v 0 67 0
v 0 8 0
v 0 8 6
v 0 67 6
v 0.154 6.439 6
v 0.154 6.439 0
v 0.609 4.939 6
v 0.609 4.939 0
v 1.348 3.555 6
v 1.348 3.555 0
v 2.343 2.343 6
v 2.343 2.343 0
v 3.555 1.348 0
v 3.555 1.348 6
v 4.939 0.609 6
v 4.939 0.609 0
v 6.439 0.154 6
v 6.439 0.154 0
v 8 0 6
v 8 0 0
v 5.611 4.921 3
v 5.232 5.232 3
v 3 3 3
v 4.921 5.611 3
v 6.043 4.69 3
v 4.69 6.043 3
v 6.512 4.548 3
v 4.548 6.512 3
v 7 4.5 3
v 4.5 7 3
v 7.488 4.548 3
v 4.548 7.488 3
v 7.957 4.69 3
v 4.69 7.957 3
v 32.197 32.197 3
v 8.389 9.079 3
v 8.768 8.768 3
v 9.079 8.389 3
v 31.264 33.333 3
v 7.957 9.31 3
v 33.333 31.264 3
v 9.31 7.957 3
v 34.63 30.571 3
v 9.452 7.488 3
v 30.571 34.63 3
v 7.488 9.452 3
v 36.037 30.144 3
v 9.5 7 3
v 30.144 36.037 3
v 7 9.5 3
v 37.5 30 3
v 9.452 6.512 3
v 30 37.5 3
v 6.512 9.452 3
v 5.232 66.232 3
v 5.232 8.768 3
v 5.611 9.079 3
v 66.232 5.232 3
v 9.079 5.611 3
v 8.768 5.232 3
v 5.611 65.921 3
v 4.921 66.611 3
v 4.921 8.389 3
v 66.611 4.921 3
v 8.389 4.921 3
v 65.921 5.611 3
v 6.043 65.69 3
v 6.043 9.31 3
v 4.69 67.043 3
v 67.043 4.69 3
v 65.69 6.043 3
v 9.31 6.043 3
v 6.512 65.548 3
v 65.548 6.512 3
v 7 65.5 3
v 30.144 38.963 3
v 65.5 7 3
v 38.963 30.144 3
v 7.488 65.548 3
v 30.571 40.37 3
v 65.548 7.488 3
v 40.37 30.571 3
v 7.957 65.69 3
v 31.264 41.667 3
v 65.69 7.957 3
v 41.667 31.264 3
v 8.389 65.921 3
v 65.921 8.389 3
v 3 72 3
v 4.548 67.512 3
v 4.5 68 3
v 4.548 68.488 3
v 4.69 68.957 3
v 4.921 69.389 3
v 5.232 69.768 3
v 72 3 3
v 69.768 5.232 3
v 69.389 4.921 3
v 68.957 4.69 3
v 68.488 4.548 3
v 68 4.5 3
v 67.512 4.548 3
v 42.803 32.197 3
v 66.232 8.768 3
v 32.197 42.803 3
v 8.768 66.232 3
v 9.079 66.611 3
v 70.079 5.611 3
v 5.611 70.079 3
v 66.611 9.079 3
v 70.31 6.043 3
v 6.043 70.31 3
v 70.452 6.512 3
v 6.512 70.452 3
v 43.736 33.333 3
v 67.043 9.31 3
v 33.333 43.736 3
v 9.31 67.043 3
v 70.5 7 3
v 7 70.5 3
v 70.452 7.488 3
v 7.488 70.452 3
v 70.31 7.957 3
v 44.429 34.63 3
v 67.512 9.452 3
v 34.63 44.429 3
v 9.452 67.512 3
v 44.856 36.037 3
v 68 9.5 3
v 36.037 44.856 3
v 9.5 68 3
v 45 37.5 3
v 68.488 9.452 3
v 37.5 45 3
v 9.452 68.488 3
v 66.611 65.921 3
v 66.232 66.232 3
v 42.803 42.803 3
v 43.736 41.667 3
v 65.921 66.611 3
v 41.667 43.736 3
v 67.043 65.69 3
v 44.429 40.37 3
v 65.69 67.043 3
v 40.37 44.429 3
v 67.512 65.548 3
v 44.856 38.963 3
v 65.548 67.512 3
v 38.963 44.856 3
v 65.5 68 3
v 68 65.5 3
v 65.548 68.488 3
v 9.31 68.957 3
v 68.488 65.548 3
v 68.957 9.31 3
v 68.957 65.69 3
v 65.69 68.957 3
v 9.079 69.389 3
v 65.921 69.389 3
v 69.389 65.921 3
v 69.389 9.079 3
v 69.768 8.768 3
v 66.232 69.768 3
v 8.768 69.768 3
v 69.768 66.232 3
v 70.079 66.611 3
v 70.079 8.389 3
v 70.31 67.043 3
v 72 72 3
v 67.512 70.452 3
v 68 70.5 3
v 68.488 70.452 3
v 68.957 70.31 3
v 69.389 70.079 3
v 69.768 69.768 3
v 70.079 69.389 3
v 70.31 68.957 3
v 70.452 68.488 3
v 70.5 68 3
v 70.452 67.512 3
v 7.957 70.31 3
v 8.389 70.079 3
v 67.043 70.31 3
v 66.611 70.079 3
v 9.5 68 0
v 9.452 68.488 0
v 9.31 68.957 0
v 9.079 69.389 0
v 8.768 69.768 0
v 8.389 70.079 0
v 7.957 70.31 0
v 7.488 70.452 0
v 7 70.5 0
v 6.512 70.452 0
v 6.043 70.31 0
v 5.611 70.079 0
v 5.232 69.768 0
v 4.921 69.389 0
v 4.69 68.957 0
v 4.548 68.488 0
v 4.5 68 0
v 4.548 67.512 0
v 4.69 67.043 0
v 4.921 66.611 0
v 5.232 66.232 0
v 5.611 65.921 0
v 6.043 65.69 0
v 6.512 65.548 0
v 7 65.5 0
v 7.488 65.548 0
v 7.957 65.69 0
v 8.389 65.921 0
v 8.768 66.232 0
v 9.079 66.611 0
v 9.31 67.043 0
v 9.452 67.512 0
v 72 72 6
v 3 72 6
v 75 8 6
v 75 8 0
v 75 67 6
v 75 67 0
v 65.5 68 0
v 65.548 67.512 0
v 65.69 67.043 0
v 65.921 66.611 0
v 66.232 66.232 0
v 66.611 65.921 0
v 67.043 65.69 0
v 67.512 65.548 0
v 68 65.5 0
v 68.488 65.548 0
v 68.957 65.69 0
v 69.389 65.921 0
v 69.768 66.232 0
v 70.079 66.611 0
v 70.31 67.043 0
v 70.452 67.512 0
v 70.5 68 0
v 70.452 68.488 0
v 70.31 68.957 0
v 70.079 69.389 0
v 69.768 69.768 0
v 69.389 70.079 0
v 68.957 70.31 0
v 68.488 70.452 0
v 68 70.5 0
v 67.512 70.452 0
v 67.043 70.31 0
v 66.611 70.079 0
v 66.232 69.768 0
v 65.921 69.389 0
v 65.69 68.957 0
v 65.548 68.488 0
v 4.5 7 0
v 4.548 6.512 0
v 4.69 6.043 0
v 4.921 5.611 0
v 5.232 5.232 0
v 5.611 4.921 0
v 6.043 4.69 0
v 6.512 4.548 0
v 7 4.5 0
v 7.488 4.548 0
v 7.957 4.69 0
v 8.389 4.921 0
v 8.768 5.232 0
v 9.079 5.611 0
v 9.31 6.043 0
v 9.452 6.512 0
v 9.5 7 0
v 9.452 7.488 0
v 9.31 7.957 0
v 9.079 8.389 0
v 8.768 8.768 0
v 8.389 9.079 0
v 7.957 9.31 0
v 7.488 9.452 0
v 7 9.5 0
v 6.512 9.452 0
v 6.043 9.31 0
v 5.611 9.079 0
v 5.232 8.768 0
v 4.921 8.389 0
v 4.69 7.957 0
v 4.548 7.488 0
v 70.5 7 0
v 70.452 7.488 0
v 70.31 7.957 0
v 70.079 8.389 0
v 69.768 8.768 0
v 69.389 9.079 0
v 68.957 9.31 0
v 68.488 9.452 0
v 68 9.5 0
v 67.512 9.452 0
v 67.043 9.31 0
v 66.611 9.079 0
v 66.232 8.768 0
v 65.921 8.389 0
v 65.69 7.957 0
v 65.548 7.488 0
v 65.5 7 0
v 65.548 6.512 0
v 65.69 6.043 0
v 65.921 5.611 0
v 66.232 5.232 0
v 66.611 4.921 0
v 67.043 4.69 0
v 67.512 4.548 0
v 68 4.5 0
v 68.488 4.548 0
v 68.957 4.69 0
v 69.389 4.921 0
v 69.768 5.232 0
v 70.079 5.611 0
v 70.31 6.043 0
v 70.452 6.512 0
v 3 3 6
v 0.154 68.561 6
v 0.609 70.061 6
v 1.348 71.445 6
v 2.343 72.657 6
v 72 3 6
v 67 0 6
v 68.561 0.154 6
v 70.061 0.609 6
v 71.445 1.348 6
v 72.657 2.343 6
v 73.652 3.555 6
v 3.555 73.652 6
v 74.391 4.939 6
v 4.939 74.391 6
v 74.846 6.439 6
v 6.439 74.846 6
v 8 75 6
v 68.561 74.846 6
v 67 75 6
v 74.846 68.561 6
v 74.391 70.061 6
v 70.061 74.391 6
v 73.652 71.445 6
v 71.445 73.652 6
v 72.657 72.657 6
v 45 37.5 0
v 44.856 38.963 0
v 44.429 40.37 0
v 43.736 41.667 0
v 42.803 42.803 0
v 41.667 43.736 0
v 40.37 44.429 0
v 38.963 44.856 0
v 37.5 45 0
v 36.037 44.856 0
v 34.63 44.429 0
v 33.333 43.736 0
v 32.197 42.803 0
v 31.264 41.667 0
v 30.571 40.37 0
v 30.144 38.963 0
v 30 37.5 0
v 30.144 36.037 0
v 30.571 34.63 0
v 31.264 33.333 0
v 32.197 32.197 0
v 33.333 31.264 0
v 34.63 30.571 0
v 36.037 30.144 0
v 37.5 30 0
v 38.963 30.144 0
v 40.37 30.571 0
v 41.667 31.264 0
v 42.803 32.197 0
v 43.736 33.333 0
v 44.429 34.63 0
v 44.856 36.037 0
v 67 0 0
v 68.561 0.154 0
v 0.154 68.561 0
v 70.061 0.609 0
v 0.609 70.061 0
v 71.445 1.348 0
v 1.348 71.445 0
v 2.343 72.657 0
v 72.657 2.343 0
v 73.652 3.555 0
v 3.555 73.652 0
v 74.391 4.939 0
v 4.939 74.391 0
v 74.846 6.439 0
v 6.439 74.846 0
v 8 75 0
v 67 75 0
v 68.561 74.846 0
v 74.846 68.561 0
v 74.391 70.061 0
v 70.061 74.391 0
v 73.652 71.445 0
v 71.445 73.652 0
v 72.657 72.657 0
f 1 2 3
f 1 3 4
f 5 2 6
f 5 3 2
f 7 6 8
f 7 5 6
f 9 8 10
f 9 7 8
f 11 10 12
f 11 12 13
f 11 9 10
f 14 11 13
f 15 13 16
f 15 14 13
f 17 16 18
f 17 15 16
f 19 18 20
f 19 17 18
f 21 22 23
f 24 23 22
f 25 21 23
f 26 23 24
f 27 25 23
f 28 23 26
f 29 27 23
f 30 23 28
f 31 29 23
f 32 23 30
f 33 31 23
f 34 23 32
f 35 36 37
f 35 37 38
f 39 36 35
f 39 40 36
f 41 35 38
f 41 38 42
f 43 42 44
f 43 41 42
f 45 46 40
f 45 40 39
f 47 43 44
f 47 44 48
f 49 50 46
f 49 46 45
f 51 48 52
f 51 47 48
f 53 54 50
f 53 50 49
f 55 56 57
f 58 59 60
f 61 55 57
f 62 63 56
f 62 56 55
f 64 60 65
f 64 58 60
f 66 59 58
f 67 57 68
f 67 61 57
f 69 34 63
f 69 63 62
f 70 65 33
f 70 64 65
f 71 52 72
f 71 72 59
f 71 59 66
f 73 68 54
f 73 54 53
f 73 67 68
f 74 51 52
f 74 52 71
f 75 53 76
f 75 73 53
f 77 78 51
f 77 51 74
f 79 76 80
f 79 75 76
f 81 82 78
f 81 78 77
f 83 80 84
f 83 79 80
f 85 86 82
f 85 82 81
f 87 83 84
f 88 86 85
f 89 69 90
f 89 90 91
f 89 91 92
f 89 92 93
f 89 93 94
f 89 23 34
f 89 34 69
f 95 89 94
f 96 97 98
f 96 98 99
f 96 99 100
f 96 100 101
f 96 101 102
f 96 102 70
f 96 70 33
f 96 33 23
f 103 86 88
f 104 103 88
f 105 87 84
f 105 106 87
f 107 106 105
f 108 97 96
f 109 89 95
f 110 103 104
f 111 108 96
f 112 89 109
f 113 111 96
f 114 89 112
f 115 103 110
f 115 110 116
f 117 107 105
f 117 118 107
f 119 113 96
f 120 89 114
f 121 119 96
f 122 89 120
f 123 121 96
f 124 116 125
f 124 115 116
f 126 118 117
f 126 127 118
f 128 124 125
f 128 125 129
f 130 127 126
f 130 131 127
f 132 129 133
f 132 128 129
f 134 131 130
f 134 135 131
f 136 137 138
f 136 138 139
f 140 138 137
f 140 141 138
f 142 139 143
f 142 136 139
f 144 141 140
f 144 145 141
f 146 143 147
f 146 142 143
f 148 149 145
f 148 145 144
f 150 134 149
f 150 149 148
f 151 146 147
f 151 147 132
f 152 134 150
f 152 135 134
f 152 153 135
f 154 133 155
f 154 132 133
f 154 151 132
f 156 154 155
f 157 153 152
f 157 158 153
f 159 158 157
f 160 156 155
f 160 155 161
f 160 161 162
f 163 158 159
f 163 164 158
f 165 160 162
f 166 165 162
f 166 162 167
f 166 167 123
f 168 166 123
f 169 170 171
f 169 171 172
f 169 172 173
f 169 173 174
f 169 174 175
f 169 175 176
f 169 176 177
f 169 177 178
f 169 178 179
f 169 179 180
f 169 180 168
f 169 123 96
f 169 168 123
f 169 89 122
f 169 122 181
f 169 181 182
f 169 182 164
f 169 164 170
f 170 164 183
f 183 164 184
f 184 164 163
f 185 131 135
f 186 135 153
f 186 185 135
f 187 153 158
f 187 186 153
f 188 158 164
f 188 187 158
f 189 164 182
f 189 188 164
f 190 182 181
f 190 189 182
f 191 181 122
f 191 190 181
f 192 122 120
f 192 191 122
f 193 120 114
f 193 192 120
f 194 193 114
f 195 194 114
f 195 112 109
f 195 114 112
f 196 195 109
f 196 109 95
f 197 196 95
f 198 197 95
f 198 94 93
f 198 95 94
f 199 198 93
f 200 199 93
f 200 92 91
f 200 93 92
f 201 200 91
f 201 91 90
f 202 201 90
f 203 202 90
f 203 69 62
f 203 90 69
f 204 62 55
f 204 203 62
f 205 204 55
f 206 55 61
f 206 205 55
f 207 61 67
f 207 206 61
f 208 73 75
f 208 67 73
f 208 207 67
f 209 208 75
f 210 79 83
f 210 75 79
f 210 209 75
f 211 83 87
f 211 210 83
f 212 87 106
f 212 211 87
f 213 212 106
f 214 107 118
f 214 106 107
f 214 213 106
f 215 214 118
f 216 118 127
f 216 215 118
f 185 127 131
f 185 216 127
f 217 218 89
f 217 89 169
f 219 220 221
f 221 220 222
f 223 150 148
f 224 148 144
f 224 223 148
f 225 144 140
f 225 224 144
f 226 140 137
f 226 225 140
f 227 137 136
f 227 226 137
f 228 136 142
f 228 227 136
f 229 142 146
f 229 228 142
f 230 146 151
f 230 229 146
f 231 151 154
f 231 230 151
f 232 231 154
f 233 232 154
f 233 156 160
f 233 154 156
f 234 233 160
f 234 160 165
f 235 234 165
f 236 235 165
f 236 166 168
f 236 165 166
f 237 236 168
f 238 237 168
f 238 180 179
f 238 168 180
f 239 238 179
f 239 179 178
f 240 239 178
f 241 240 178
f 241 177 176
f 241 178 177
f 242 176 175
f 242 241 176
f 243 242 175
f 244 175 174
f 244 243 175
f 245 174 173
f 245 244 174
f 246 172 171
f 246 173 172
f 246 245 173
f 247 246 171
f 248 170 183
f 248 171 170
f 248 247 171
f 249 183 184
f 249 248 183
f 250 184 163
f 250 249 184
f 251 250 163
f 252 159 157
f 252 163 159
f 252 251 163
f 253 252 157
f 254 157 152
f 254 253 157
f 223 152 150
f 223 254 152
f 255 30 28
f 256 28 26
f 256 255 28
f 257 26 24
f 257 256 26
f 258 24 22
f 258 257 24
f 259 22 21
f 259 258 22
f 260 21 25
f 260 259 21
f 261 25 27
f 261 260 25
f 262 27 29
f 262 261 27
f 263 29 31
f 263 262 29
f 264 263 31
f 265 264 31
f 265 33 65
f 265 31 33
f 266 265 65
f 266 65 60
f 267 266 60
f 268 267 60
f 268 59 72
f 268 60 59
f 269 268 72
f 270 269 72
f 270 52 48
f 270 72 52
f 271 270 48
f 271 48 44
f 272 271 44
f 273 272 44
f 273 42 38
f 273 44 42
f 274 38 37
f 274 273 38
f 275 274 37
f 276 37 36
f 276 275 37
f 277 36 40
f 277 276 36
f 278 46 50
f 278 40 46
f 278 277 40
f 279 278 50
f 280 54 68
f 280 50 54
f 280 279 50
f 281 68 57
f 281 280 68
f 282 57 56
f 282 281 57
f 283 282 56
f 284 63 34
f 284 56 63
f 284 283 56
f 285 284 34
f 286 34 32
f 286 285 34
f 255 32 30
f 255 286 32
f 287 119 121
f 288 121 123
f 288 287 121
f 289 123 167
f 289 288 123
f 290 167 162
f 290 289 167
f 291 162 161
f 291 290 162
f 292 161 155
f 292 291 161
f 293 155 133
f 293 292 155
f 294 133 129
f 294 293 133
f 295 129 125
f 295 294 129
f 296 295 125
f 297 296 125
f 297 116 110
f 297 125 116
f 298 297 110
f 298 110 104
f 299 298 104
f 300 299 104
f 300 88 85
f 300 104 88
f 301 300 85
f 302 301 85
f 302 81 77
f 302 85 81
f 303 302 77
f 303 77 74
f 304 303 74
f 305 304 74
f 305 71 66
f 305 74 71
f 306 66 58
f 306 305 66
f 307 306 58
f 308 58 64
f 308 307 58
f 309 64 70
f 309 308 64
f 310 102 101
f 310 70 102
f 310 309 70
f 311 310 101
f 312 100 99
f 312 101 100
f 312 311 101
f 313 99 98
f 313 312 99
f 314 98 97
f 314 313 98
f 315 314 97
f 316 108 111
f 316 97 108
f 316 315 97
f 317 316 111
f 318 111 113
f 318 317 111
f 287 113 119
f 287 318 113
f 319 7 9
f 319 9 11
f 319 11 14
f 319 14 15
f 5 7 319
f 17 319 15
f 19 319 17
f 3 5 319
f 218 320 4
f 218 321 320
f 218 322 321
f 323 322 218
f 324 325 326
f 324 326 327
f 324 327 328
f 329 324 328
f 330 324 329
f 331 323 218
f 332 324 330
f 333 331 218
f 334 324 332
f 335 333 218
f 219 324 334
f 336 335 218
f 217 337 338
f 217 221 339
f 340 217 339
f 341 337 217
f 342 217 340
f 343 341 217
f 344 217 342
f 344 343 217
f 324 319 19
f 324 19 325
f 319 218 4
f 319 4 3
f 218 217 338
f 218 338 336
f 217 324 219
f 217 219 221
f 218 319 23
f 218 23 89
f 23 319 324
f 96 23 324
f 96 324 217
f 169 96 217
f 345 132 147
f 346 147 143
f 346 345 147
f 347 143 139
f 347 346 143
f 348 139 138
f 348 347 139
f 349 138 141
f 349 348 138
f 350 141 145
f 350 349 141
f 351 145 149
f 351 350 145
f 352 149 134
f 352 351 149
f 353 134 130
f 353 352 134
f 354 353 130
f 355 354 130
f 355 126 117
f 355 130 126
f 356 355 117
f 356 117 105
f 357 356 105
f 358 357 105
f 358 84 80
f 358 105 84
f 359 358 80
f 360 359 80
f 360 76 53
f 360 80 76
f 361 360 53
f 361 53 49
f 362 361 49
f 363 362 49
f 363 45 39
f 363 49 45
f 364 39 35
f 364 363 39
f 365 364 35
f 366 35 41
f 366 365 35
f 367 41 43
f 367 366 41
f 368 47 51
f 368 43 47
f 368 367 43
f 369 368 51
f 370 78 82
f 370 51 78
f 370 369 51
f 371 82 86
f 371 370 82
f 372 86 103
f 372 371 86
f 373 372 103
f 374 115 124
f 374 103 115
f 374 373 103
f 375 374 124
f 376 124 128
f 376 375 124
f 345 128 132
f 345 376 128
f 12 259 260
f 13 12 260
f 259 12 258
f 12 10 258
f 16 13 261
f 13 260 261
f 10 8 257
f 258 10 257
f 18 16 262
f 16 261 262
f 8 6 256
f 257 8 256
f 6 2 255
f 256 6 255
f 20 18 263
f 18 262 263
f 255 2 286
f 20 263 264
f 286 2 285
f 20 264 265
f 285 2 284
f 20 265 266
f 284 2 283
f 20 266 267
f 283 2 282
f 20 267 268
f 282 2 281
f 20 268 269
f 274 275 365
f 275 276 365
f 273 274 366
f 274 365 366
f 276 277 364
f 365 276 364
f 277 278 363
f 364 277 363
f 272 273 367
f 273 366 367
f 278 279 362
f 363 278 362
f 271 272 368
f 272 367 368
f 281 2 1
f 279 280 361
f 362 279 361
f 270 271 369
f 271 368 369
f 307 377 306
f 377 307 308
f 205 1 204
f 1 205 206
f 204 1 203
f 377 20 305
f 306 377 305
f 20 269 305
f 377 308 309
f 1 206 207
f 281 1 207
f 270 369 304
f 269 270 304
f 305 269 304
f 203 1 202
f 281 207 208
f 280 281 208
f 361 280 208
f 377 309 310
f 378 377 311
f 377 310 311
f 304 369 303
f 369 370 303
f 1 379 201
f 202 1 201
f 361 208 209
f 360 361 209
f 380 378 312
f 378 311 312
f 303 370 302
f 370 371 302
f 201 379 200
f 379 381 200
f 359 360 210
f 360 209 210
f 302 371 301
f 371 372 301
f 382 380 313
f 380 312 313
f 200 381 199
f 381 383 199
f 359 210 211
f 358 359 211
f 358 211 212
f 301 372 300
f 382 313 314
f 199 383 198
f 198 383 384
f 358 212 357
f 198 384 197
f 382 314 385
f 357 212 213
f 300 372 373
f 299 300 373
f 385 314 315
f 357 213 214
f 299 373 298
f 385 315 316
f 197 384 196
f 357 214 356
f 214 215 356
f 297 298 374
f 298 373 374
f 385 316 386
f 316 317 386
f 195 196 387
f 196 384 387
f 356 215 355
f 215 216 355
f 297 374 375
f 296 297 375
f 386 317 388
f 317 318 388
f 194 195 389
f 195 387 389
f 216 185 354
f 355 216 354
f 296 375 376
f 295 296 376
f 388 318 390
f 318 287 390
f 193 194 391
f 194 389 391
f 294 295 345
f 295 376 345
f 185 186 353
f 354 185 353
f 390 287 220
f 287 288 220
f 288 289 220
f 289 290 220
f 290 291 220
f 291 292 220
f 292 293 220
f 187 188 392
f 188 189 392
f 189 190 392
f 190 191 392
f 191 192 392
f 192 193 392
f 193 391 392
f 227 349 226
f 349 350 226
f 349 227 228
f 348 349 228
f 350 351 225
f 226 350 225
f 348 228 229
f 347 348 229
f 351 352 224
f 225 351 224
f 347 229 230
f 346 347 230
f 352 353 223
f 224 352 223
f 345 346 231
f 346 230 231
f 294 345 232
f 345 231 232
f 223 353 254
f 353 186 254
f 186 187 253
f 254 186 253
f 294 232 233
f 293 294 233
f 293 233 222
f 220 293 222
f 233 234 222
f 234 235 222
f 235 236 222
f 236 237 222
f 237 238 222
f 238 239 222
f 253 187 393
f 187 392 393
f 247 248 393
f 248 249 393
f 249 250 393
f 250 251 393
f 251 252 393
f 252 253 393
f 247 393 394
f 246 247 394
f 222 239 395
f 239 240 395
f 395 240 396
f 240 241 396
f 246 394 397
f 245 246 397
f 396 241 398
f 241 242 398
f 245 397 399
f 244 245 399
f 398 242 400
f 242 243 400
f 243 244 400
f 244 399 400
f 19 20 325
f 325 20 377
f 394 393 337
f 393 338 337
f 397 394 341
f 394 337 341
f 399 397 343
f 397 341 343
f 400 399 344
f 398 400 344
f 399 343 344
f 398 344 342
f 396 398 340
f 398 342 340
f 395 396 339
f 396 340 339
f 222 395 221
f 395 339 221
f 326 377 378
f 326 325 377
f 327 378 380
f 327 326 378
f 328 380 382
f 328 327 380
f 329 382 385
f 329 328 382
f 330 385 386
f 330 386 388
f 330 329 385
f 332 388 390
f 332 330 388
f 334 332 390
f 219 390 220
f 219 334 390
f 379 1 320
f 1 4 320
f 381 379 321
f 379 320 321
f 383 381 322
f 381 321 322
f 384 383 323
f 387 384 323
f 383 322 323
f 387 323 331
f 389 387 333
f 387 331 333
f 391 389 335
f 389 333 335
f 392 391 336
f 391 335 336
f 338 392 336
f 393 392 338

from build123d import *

# Parameters (mm, degrees)
SKETCH1_W           = 75
SKETCH1_H           = 75
SKETCH1_R           = 2.5
SKETCH1_R_2         = 7.5
BOSS_EXTRUDE1_DEPTH = 6
SKETCH2_W           = 69
SKETCH2_H           = 69
CUT_EXTRUDE1_DEPTH  = 3
FILLET1_R           = 8


with BuildPart() as part:
    # Sketch1 → Boss-Extrude1 (new body)
    with BuildSketch(Plane.XY):
        with Locations((37.5, 37.5)):
            Rectangle(SKETCH1_W, SKETCH1_H)
        with Locations((7, 68)):
            Circle(SKETCH1_R, mode=Mode.SUBTRACT)
        with Locations(Location((68, 68, 0), (0, 0, 180))):
            Circle(SKETCH1_R, mode=Mode.SUBTRACT)
        with Locations((68, 7)):
            Circle(SKETCH1_R, mode=Mode.SUBTRACT)
        with Locations(Location((7, 7, 0), (0, 0, 180))):
            Circle(SKETCH1_R, mode=Mode.SUBTRACT)
        with Locations((37.5, 37.5)):
            Circle(SKETCH1_R_2, mode=Mode.SUBTRACT)
    extrude(amount=BOSS_EXTRUDE1_DEPTH)

    # Sketch2 → Cut-Extrude1 (cut)
    with BuildSketch(Plane.XY.offset(6)):
        with Locations((37.5, 37.5)):
            Rectangle(SKETCH2_W, SKETCH2_H)
    extrude(amount=-CUT_EXTRUDE1_DEPTH, mode=Mode.SUBTRACT)

    # Fillet1
    fillet1_edges = [part.edges().sort_by_distance(p)[0] for p in [
        (0, 75, 3),
        (75, 75, 3),
        (75, 0, 3),
        (0, 0, 3),
    ]]
    fillet(fillet1_edges, radius=FILLET1_R)


solid = part.part
